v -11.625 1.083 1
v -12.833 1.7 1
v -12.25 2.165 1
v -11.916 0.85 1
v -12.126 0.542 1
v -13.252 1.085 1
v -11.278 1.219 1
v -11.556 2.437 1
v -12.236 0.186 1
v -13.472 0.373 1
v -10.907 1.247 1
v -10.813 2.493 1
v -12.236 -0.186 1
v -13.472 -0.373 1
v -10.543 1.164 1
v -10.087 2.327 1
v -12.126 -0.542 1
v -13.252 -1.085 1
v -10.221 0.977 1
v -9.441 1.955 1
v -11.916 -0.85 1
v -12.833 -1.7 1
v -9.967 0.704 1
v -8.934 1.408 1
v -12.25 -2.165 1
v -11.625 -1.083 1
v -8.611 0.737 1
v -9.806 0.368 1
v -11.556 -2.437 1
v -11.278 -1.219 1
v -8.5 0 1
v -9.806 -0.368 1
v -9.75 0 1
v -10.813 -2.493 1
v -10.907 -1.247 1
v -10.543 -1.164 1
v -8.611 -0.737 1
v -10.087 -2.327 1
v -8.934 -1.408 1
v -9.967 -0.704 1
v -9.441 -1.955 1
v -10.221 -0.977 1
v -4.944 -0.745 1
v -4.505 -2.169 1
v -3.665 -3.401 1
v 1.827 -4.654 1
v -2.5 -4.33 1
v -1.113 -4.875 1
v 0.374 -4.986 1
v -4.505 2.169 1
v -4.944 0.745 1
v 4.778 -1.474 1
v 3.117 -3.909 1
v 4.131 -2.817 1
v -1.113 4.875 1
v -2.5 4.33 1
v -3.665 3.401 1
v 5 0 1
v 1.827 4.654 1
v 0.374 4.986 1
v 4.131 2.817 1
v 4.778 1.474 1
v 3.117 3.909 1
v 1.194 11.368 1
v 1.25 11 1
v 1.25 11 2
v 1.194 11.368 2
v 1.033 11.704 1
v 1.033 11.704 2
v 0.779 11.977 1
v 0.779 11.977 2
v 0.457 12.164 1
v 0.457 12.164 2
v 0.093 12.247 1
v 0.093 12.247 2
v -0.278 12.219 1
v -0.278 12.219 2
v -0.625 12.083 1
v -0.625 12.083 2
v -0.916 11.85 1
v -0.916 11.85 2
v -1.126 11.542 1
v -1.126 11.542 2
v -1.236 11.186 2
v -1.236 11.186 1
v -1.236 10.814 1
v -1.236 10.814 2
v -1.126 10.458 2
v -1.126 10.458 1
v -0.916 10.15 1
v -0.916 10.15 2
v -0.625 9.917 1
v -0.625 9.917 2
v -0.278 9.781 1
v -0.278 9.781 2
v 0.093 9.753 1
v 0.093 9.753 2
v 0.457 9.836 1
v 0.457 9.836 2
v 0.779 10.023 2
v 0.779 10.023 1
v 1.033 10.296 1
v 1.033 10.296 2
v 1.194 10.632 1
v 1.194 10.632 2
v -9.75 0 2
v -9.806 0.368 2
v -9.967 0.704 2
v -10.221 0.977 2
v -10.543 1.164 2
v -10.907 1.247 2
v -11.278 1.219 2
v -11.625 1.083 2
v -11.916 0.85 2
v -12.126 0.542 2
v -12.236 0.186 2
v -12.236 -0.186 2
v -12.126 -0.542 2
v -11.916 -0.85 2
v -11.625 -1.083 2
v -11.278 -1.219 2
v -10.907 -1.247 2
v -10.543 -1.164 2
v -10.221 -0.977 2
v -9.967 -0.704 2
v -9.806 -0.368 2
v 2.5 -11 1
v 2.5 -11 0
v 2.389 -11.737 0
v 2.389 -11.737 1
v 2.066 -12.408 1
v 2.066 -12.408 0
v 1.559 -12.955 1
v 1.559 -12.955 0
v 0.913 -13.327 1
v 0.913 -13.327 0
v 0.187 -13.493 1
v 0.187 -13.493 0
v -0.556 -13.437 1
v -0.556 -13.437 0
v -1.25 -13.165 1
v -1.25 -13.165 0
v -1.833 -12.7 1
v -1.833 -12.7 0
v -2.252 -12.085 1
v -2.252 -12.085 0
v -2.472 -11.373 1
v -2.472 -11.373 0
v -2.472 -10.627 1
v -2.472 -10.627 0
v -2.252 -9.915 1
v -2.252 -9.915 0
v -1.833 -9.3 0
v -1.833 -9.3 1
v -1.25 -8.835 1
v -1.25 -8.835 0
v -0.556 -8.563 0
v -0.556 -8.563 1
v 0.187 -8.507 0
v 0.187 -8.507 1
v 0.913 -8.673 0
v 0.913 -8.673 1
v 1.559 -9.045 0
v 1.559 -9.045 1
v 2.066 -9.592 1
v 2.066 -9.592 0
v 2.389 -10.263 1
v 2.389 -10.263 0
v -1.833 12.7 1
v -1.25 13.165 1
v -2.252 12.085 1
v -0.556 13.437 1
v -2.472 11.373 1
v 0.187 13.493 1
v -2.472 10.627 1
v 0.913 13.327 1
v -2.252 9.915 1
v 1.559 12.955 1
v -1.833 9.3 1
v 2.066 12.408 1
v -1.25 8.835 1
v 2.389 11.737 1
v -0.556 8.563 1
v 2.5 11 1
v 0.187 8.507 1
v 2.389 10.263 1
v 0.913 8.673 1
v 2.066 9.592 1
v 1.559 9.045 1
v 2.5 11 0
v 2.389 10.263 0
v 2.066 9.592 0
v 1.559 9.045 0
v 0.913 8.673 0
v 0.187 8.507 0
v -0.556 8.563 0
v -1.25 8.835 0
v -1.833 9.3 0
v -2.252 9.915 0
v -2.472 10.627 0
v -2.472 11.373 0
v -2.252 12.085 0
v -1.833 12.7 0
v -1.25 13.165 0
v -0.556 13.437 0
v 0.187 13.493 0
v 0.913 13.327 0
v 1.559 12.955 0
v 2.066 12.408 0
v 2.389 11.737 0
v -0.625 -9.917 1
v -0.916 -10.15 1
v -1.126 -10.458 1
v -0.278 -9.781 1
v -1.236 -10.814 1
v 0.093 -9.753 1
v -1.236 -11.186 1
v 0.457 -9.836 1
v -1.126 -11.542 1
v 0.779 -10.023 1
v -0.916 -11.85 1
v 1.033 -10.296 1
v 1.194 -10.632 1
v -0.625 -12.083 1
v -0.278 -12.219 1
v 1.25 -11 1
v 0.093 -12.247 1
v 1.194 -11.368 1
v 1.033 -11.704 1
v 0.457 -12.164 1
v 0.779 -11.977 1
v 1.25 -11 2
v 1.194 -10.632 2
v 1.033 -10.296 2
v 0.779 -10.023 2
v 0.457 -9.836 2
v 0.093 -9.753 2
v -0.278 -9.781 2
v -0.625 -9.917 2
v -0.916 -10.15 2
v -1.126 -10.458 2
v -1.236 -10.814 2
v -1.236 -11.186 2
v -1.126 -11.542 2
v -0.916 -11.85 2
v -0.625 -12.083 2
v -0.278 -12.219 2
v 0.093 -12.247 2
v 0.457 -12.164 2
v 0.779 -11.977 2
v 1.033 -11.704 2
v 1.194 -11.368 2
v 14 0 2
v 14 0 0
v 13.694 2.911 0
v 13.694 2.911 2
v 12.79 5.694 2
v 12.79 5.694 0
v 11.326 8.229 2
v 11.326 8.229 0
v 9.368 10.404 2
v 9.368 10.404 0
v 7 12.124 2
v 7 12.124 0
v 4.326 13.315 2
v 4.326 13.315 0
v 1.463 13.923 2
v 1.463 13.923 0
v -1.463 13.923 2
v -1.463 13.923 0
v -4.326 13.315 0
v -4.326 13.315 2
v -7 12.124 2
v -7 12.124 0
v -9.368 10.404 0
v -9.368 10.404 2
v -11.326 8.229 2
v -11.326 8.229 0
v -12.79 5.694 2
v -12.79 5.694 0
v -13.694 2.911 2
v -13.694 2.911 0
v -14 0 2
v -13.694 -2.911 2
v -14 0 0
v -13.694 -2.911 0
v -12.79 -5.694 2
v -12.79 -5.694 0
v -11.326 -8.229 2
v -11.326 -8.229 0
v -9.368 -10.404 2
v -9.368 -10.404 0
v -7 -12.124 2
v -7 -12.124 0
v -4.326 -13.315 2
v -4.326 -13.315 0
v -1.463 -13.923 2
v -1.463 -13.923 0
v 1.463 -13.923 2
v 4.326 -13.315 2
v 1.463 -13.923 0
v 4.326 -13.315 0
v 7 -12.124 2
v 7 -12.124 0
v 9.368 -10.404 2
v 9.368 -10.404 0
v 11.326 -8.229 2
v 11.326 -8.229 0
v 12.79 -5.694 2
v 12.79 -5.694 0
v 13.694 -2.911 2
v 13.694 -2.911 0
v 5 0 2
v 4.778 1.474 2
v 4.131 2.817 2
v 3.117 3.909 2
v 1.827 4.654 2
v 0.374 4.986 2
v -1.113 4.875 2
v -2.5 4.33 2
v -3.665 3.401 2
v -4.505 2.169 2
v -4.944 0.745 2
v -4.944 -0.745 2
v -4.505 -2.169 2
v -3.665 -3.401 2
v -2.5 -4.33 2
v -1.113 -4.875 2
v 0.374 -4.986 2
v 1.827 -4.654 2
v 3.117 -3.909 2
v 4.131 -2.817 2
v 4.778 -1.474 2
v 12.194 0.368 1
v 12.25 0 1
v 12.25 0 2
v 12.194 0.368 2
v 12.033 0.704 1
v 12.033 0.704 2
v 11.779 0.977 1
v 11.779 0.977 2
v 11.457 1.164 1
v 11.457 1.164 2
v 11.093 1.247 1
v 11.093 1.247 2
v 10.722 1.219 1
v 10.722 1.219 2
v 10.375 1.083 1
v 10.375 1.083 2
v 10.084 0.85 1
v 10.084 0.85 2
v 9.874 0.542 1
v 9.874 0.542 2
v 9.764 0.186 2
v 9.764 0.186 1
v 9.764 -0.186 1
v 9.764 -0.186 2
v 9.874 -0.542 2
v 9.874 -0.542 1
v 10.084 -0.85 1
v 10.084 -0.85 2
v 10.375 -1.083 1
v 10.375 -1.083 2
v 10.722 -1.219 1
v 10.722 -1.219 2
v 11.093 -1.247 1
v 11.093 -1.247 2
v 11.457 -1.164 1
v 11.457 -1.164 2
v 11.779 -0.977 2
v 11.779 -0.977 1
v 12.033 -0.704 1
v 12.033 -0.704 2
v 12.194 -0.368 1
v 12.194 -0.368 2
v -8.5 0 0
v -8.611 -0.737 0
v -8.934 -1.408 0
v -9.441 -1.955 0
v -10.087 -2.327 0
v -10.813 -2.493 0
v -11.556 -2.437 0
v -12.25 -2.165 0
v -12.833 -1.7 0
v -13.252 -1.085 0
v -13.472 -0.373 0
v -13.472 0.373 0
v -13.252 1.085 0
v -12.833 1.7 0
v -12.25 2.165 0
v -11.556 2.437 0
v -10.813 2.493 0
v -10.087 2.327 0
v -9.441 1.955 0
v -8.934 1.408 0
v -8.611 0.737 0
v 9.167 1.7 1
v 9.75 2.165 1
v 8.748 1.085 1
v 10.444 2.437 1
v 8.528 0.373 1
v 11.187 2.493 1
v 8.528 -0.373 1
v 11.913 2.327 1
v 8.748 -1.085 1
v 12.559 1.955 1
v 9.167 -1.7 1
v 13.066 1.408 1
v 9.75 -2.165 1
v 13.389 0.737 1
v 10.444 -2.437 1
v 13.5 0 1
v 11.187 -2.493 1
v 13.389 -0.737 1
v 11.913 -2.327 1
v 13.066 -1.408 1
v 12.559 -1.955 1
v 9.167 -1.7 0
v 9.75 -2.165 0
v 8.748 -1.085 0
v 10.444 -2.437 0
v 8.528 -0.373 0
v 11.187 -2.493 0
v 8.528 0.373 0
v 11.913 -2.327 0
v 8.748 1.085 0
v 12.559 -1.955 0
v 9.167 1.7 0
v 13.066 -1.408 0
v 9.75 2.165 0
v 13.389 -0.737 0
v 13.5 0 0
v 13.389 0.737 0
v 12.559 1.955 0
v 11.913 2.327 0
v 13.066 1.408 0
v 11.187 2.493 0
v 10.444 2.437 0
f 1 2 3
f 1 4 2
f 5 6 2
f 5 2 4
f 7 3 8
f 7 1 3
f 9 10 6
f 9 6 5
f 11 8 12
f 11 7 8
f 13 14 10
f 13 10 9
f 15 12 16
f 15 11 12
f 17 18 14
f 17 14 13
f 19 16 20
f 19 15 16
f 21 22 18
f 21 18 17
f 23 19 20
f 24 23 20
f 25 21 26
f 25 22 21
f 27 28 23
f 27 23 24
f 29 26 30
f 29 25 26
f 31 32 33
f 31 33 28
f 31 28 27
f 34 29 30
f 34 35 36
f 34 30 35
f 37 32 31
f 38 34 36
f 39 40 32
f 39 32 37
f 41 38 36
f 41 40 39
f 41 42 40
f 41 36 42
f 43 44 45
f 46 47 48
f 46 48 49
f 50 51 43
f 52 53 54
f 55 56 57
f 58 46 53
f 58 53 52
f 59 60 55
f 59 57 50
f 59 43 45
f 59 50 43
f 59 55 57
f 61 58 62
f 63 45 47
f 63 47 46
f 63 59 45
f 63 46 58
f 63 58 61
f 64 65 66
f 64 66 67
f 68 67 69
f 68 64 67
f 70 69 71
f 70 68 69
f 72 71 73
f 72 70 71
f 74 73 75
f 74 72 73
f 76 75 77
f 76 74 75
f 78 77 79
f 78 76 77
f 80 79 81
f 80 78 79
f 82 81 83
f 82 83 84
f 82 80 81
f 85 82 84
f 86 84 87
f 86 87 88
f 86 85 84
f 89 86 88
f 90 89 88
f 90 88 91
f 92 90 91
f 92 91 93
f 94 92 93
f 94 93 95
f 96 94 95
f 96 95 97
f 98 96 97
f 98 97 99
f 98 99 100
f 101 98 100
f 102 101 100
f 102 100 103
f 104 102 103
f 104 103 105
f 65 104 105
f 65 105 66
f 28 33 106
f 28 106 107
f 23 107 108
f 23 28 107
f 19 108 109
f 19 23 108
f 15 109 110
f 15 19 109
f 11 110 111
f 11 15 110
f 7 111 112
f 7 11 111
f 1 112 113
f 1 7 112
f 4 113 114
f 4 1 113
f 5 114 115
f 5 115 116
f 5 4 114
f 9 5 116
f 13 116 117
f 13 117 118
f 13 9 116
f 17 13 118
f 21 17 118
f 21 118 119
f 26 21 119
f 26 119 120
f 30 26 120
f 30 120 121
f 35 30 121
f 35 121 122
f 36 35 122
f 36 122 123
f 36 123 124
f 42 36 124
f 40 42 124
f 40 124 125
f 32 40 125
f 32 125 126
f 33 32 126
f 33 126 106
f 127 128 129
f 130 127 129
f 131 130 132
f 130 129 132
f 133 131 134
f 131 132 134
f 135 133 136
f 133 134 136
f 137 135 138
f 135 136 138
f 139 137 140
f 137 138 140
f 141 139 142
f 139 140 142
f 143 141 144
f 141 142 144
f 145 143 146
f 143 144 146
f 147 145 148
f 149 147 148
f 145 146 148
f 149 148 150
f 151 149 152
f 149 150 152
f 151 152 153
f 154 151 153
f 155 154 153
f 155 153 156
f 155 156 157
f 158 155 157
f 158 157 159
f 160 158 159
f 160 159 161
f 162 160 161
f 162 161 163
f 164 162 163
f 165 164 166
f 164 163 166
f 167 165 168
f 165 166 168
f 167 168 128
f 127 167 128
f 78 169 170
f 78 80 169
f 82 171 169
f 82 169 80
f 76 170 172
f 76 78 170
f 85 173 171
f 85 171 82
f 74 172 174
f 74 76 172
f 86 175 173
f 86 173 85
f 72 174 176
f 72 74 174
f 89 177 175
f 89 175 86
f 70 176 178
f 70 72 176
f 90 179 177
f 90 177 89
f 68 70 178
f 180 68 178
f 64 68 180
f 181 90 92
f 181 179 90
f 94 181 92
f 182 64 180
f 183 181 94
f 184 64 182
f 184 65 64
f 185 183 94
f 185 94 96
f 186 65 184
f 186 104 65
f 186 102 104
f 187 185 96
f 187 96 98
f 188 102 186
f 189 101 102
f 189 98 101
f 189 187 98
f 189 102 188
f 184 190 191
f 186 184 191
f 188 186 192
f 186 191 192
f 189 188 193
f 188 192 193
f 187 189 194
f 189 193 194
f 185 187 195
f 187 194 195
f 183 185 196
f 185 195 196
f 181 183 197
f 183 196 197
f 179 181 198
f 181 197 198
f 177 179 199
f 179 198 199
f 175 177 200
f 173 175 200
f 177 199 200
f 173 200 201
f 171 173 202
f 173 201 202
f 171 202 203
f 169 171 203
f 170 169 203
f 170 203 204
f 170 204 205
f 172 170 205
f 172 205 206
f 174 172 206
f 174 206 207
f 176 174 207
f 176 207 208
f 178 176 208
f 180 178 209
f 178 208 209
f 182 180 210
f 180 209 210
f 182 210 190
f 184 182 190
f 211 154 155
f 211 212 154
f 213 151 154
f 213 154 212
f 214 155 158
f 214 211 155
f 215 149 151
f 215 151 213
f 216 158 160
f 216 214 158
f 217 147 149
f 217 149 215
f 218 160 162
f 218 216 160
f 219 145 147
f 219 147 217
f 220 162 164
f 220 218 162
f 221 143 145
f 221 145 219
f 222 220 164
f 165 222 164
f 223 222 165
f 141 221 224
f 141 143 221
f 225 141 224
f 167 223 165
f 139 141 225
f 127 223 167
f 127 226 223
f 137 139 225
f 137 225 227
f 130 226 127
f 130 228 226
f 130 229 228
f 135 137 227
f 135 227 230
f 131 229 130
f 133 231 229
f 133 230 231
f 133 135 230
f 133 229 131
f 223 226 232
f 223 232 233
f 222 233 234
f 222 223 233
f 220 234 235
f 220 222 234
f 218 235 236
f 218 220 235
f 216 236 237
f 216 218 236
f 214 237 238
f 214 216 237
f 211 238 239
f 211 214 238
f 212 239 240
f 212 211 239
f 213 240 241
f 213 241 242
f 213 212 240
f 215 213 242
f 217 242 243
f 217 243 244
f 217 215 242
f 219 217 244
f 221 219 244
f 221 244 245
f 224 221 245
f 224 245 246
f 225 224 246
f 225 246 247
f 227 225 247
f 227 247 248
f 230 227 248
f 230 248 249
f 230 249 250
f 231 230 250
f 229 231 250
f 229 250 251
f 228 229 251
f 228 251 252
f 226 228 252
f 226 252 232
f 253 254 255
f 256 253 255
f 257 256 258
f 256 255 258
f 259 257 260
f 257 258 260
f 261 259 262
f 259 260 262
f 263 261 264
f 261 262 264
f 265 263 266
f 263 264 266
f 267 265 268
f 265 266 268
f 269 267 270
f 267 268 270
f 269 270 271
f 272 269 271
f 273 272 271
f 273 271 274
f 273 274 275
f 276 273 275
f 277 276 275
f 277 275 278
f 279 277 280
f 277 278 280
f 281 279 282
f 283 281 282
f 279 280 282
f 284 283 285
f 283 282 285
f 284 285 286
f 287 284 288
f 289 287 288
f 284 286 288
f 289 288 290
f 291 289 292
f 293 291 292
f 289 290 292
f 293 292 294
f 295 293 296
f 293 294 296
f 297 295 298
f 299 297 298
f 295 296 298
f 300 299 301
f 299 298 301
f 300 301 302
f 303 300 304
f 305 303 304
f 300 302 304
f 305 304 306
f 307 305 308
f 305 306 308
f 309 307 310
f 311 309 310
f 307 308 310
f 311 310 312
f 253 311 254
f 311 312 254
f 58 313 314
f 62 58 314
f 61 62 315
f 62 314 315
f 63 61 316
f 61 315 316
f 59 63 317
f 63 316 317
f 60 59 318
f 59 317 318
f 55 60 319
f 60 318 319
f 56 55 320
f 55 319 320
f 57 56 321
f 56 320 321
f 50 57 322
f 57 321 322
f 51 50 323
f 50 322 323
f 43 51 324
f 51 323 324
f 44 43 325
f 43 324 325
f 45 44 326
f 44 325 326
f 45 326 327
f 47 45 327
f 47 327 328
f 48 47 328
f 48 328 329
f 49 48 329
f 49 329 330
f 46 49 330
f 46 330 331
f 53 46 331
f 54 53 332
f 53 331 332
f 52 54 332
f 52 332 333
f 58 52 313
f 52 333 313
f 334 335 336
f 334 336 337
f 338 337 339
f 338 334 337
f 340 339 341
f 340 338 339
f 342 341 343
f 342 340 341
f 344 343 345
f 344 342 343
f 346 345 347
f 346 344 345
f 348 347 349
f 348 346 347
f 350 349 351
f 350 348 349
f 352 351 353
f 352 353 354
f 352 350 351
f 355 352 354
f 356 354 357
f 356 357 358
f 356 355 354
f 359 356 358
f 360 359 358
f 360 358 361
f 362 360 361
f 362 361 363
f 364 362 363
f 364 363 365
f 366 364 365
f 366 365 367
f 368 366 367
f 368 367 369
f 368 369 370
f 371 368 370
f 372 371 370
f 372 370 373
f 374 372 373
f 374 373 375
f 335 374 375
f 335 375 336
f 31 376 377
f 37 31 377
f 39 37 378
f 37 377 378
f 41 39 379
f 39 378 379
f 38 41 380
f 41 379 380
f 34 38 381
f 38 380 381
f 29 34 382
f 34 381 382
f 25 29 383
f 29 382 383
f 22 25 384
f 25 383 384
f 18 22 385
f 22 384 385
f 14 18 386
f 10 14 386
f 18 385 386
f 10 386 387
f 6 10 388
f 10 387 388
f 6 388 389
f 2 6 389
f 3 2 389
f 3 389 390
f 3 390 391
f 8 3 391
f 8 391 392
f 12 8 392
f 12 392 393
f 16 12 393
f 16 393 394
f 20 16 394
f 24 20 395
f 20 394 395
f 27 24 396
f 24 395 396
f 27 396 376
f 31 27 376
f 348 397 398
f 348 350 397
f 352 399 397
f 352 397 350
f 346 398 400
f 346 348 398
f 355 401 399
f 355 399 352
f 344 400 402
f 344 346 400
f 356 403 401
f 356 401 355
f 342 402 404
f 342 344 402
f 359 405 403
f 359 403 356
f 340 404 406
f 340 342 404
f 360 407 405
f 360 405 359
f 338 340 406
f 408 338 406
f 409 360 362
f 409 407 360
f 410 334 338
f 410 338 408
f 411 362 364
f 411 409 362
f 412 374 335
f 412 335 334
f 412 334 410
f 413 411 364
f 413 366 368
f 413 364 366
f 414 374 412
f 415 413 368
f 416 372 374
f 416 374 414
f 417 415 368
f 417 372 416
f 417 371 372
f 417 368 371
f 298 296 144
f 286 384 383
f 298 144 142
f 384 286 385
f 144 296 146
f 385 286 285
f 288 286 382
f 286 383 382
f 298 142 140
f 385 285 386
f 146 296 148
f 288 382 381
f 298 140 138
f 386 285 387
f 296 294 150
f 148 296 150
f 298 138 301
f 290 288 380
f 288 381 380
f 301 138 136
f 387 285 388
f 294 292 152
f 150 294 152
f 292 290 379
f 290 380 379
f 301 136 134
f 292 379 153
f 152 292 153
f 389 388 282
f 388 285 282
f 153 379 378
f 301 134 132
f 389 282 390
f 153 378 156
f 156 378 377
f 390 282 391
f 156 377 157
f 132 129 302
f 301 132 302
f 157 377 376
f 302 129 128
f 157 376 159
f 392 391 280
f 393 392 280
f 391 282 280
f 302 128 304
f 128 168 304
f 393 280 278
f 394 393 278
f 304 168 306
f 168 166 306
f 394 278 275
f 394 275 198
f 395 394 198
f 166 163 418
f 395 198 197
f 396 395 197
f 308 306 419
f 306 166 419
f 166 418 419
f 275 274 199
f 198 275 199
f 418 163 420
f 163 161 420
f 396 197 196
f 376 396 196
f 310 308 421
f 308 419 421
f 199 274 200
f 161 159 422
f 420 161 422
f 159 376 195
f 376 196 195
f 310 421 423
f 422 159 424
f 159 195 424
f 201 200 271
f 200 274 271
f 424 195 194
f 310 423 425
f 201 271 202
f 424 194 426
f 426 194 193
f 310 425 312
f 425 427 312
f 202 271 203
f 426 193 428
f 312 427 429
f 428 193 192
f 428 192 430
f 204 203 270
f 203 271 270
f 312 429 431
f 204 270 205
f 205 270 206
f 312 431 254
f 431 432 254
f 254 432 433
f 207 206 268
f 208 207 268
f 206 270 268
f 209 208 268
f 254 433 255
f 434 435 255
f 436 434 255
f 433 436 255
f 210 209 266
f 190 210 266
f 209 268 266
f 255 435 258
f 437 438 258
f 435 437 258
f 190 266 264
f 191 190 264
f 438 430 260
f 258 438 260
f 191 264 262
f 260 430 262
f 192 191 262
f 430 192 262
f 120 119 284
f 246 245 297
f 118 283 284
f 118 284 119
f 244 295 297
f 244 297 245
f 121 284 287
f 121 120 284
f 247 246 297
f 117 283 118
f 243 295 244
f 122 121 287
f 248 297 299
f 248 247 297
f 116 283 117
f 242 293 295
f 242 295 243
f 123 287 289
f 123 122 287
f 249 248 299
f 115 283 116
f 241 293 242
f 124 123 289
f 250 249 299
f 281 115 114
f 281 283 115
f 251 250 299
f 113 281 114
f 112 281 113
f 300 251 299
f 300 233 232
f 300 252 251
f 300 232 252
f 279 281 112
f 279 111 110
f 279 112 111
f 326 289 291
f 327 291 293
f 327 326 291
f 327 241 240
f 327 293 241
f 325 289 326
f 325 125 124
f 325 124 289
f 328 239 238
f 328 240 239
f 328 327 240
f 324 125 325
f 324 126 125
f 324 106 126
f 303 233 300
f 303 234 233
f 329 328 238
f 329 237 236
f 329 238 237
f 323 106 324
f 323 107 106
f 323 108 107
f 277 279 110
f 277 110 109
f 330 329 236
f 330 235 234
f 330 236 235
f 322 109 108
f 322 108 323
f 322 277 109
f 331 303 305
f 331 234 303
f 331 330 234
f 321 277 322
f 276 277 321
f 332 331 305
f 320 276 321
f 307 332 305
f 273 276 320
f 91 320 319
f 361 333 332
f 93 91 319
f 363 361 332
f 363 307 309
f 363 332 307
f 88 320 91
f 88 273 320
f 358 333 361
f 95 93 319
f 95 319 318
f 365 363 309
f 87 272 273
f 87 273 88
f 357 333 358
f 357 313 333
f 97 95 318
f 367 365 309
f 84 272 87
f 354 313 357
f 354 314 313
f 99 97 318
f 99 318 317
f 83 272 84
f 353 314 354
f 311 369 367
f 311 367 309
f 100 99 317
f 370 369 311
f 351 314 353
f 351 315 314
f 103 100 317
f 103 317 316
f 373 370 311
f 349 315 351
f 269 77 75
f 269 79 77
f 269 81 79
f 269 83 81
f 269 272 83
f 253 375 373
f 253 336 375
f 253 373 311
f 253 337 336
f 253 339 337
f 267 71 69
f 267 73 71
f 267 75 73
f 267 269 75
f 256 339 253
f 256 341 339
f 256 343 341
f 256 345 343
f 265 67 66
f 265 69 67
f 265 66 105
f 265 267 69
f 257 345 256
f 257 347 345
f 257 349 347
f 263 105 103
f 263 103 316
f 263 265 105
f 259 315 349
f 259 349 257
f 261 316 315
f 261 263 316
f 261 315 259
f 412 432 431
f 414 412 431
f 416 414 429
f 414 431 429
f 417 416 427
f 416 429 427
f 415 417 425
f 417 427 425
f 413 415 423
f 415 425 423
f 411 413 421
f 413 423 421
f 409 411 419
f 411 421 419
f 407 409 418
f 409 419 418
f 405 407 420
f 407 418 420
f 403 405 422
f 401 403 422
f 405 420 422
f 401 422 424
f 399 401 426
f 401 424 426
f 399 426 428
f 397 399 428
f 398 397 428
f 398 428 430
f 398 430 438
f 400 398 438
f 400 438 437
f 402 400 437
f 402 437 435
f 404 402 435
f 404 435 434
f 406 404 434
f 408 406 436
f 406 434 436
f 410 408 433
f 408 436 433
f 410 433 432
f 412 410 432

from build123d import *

# Parameters (mm, degrees)
SKETCH_R        = 14
SKETCH_R_2      = 1.25
PAD_DEPTH       = 2
SKETCH001_R     = 5
POCKET_DEPTH    = 1
SKETCH002_R     = 2.5
POCKET001_DEPTH = 1


with BuildPart() as part:
    # Sketch → Pad (new body)
    with BuildSketch(Plane.XY):
        Circle(SKETCH_R)
        with Locations((0, 11)):
            Circle(SKETCH_R_2, mode=Mode.SUBTRACT)
        with Locations((-11, 0)):
            Circle(SKETCH_R_2, mode=Mode.SUBTRACT)
        with Locations((0, -11)):
            Circle(SKETCH_R_2, mode=Mode.SUBTRACT)
        with Locations((11, 0)):
            Circle(SKETCH_R_2, mode=Mode.SUBTRACT)
    extrude(amount=PAD_DEPTH)

    # Sketch001 (on Face7 of Pad) → Pocket (cut)
    with BuildSketch(Plane.XY.offset(2)):
        Circle(SKETCH001_R)
    extrude(amount=-POCKET_DEPTH, mode=Mode.SUBTRACT)

    # Sketch002 (on Face2 of Pocket) → Pocket001 (cut)
    with BuildSketch(Plane(origin=(0, 0, 0), x_dir=(1, 0, 0), z_dir=(0, 0, -1))):
        with Locations((0, 11)):
            Circle(SKETCH002_R)
        with Locations((11, 0)):
            Circle(SKETCH002_R)
        with Locations((-11, 0)):
            Circle(SKETCH002_R)
        with Locations((0, -11)):
            Circle(SKETCH002_R)
    extrude(amount=-POCKET001_DEPTH, mode=Mode.SUBTRACT)


solid = part.part
